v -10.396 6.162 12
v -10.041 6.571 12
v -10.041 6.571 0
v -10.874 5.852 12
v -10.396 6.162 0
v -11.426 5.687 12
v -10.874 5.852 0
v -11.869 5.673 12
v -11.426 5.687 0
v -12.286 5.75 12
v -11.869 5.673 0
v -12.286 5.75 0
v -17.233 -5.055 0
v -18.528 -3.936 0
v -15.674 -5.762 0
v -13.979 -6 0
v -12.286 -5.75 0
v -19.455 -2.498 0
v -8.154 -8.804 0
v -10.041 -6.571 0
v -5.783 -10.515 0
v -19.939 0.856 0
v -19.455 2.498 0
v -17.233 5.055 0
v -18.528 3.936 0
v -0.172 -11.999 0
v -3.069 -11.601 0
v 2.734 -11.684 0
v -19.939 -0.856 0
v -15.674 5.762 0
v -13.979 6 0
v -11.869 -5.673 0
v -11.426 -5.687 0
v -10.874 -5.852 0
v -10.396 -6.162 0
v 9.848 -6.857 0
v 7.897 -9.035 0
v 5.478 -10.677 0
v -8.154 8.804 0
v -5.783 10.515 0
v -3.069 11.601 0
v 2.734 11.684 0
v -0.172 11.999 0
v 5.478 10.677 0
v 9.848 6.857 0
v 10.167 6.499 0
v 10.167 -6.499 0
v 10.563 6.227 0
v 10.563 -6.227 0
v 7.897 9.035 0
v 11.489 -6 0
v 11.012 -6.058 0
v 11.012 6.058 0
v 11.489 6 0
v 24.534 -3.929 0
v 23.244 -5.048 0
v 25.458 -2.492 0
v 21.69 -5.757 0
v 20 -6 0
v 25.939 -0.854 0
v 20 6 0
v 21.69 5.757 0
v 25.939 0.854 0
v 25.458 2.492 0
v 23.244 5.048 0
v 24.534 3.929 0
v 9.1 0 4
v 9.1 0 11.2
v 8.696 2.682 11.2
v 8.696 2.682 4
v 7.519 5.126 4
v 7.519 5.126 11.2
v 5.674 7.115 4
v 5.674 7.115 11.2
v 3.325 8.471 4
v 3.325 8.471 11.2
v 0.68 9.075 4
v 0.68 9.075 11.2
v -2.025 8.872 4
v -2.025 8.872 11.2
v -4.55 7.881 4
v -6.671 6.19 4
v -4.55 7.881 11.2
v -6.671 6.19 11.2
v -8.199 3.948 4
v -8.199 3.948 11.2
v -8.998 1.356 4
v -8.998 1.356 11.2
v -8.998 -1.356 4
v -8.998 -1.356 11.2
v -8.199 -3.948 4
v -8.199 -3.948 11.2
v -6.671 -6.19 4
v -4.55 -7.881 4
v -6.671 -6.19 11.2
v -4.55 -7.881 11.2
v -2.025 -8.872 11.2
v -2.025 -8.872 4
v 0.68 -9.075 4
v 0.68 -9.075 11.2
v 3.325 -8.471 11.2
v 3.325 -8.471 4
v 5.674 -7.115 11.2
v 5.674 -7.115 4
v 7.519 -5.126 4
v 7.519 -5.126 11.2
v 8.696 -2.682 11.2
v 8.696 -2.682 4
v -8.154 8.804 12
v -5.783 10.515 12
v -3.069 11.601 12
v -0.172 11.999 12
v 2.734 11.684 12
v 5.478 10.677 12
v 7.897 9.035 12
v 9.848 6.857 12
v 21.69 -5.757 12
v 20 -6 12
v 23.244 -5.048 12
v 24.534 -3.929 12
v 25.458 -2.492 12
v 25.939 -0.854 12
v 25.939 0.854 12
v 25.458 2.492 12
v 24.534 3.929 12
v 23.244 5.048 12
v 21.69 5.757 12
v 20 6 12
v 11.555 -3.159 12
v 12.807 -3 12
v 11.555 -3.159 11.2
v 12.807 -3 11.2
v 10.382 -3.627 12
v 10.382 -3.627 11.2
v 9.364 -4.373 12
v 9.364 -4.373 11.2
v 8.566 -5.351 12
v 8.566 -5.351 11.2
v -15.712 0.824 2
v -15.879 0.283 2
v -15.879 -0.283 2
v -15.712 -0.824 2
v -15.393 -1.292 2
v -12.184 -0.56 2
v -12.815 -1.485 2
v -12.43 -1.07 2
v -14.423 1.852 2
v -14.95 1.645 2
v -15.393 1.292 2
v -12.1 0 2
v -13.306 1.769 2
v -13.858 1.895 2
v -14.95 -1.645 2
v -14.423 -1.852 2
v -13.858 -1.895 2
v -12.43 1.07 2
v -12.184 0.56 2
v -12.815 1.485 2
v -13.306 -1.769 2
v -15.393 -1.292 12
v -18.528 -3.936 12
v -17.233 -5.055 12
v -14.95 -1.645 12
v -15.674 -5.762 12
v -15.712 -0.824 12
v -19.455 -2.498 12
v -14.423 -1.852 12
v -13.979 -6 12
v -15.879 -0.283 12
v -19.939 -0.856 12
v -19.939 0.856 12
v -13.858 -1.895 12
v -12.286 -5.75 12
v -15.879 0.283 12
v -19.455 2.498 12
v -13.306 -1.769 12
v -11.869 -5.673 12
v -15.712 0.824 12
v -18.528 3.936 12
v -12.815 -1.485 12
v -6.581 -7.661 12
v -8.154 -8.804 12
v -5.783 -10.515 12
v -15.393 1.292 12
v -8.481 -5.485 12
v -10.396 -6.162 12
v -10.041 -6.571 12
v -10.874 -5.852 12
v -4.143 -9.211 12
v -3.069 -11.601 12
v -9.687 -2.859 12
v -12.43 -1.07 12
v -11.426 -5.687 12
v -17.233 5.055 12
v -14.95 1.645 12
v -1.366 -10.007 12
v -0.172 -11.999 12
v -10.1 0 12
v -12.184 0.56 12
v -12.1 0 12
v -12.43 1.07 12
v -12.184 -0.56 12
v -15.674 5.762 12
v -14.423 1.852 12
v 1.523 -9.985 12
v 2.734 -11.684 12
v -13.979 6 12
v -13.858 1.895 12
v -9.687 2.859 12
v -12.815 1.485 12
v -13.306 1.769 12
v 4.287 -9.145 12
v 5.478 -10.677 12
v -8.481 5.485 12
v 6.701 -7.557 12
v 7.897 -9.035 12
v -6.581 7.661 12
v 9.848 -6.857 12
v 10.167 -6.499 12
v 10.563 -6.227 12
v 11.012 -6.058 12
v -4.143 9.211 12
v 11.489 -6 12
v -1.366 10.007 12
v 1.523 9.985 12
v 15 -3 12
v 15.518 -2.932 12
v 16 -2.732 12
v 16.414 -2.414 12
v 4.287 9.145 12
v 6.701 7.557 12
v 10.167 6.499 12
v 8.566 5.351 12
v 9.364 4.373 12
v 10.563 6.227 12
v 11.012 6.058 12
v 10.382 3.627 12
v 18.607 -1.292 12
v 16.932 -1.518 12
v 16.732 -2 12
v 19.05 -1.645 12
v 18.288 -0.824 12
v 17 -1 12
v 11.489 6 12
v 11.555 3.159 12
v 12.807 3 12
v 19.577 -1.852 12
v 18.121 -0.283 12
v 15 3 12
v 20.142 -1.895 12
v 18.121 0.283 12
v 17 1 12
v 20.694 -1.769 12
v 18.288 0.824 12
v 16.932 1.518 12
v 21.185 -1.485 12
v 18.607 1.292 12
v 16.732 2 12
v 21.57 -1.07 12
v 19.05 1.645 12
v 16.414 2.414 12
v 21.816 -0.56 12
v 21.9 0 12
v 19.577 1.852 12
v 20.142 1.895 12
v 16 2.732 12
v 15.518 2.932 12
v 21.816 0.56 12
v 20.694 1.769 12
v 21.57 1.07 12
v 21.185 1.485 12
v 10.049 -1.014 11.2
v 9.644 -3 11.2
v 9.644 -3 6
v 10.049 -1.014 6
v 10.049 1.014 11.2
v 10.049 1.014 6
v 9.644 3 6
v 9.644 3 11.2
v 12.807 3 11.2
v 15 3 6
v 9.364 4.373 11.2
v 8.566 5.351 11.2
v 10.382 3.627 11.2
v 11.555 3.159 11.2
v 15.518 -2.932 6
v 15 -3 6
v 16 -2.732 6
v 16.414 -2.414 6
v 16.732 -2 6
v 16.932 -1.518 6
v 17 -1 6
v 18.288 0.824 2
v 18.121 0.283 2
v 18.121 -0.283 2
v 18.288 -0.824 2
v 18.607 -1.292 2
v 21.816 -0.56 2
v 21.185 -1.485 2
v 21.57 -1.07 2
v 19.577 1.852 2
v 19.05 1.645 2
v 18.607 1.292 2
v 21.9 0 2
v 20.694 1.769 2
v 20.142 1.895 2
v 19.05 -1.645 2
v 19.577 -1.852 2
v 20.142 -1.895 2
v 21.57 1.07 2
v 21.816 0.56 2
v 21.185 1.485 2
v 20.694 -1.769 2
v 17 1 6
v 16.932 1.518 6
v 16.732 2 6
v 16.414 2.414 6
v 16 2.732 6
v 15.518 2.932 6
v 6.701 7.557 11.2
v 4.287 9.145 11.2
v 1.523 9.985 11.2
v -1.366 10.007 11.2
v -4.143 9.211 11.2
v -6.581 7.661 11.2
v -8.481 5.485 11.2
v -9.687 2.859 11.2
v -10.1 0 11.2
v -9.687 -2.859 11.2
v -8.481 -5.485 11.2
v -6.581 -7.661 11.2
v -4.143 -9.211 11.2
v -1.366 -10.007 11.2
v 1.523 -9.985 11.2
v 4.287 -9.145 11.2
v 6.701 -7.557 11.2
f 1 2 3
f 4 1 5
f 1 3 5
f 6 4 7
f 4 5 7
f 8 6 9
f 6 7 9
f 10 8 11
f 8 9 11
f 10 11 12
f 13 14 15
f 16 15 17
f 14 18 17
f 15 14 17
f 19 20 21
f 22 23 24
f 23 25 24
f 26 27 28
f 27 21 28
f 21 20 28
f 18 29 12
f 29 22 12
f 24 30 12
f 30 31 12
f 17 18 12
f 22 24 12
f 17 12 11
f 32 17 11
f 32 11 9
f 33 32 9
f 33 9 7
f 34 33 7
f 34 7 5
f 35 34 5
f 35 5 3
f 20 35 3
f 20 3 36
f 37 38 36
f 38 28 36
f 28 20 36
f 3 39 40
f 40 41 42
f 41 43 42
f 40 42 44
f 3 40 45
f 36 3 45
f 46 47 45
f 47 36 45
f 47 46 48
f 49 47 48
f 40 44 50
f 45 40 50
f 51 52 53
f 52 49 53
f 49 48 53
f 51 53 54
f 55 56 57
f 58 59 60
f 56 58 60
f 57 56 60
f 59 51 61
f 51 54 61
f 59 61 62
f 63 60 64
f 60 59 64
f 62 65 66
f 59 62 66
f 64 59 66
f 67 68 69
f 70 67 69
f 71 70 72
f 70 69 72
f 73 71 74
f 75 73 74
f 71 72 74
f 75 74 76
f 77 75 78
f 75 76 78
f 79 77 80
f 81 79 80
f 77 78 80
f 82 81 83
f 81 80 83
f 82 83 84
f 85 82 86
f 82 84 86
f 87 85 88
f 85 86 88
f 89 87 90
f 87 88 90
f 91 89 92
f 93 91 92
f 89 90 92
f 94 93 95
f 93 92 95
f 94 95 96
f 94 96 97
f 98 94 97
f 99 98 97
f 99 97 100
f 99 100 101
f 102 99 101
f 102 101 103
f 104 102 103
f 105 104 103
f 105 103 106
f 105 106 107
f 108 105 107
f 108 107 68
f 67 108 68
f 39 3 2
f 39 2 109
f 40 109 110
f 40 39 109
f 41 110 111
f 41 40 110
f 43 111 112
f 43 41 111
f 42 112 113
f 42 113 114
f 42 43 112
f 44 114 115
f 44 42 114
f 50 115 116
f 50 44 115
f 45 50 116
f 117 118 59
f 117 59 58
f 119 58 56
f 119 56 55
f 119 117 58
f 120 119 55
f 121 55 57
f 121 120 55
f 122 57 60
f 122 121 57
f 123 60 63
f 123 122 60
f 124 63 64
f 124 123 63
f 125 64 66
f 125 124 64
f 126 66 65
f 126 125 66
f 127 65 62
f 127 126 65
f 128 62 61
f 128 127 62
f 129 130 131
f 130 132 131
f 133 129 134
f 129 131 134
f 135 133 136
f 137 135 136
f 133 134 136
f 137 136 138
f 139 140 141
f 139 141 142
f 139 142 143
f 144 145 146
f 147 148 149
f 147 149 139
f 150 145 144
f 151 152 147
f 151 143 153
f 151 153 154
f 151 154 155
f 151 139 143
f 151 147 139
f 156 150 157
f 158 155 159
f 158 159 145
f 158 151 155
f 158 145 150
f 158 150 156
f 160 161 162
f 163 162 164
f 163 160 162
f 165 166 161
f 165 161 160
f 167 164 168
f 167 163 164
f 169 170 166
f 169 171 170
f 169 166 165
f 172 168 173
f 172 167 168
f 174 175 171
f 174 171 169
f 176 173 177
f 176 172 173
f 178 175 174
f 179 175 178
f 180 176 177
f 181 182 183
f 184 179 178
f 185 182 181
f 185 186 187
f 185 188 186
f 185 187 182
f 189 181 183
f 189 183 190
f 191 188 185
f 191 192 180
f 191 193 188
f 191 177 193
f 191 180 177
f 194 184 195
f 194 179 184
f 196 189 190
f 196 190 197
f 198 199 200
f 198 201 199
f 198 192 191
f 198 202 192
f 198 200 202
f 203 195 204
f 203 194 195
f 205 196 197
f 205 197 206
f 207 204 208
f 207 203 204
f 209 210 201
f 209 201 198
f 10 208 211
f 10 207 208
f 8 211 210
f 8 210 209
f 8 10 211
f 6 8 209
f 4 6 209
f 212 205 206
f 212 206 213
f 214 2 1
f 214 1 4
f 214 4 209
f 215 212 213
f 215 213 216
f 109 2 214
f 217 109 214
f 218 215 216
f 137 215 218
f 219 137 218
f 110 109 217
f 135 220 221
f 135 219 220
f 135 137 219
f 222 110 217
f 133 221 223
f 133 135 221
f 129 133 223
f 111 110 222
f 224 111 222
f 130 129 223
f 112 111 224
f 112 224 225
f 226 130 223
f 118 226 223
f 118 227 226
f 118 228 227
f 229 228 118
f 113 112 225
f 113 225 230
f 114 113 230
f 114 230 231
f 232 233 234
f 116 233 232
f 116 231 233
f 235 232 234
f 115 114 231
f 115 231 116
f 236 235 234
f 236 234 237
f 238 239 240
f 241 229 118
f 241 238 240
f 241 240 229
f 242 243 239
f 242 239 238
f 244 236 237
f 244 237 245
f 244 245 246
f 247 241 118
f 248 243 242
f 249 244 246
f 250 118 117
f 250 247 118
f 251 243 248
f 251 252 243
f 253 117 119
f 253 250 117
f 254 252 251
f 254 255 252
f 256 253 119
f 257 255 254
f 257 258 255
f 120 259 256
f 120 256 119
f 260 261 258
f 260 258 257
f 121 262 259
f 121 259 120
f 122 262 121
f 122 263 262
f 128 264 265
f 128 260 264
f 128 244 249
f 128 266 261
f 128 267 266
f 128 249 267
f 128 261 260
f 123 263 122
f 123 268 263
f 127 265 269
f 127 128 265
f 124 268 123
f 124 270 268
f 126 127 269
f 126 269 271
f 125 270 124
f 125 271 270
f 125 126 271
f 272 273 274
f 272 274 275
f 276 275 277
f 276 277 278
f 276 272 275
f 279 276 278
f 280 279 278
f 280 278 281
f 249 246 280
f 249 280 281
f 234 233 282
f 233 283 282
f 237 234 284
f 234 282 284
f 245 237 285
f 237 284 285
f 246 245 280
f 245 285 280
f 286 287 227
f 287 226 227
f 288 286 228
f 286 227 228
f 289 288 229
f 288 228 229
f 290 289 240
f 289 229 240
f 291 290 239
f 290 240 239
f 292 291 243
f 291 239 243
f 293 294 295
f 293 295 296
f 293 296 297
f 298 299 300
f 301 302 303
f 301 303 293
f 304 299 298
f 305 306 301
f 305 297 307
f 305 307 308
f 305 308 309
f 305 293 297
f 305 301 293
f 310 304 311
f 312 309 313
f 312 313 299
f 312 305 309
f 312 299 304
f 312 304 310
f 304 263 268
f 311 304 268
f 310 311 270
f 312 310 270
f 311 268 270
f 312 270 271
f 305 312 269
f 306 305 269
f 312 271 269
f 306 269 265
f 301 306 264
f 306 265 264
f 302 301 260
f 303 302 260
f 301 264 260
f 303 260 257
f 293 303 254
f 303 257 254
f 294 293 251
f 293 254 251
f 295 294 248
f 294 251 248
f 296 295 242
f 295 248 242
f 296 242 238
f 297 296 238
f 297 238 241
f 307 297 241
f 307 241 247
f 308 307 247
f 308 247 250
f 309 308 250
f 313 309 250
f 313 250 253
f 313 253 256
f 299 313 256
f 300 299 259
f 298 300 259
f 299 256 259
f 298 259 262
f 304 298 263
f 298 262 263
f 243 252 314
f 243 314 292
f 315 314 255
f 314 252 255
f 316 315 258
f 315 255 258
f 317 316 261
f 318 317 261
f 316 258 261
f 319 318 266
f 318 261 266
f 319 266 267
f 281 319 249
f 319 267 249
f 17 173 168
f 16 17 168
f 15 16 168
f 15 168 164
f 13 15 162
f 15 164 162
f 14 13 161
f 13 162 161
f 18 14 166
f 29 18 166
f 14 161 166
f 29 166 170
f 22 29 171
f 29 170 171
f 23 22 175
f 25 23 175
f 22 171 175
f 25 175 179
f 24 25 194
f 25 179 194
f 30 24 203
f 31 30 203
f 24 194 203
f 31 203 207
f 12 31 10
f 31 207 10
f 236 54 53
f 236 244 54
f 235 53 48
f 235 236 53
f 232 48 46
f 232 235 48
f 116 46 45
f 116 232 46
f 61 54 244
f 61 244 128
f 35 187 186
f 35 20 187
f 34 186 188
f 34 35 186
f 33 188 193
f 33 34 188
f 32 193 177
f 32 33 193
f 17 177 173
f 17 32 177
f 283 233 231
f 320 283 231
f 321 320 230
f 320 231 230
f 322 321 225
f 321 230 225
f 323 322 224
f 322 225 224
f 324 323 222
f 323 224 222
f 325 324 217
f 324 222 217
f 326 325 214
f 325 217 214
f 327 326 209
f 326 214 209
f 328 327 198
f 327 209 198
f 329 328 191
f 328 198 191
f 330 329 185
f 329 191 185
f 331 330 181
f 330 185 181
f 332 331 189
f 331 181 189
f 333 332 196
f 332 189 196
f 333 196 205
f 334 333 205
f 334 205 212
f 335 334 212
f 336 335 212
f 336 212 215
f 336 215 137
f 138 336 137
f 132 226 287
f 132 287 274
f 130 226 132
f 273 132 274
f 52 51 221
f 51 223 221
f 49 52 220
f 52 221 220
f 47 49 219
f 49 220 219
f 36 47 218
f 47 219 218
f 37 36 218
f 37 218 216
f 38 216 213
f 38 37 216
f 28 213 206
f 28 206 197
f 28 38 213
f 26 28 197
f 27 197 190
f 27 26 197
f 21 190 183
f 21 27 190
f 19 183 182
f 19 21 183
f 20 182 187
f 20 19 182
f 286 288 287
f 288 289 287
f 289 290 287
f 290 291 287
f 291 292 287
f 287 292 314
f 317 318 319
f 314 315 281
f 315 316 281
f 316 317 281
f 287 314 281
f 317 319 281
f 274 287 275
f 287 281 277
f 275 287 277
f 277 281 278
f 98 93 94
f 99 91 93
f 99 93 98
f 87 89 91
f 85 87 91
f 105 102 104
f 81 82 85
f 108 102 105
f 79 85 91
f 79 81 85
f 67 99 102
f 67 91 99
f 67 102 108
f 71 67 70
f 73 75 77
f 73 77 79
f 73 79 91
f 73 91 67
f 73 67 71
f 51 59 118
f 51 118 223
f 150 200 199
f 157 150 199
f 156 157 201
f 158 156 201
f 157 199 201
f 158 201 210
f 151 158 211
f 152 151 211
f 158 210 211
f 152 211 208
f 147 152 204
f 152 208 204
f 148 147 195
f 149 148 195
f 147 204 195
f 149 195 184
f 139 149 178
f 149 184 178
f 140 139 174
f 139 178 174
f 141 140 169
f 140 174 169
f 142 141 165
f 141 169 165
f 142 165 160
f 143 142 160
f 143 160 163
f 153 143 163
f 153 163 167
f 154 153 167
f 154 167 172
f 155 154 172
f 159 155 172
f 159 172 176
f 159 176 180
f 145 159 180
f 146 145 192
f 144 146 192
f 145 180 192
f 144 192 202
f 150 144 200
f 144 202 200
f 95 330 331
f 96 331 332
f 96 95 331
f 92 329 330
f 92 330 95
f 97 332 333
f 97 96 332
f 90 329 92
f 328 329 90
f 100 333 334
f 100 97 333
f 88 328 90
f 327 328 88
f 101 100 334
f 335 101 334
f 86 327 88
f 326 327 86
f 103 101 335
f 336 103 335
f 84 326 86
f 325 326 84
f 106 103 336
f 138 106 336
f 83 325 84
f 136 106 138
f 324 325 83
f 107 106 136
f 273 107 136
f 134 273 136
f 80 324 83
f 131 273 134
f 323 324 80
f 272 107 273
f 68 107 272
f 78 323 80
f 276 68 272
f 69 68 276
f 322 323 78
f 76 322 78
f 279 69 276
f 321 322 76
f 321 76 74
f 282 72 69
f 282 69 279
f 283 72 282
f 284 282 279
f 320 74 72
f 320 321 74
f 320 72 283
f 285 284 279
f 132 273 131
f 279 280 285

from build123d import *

# Parameters (mm, degrees)
BOSS_EXTRU_1_DEPTH      = 12
ESQUISSE2_R             = 9.1
ENL_V_MAT_EXTRU_3_DEPTH = 8
ENL_V_MAT_EXTRU_4_DEPTH = 6
ENL_V_MAT_EXTRU_5_DEPTH = 0.8
BOSS_EXTRU_2_DEPTH      = 12
ESQUISSE6_R             = 1.9
ENL_V_MAT_EXTRU_6_DEPTH = 10
CONG_1_R                = 5
CONG_2_R                = 2


with BuildPart() as part:
    # Esquisse1 → Boss.-Extru.1 (new body)
    with BuildSketch(Plane.XY):
        with BuildLine():
            Line((10.392304845, 6), (20, 6))
            Line((20, 6), (20, -6))
            Line((20, -6), (10.392304845, -6))
            ThreePointArc((10.392304845, -6), (-12, 0), (10.392304845, 6))
        make_face()
    extrude(amount=BOSS_EXTRU_1_DEPTH)

    # Esquisse2 → Enlèv. mat.-Extru.3 (cut)
    with BuildSketch(Plane.XY.offset(12)):
        Circle(ESQUISSE2_R)
    extrude(amount=-ENL_V_MAT_EXTRU_3_DEPTH, mode=Mode.SUBTRACT)

    # Esquisse3 → Enlèv. mat.-Extru.4 (cut)
    with BuildSketch(Plane.XY.offset(12)):
        with BuildLine():
            Line((9.644169223, 3), (17, 3))
            Line((17, 3), (17, -3))
            Line((17, -3), (9.644169223, -3))
            ThreePointArc((9.644169223, -3), (10.1, 0), (9.644169223, 3))
        make_face()
    extrude(amount=-ENL_V_MAT_EXTRU_4_DEPTH, mode=Mode.SUBTRACT)

    # Esquisse4 → Enlèv. mat.-Extru.5 (cut)
    with BuildSketch(Plane.XY.offset(12)):
        with BuildLine():
            Line((17, -3), (17, 3))
            Line((17, 3), (9.644169223, 3))
            ThreePointArc((9.644169223, 3), (-10.1, 0), (9.644169223, -3))
            Line((9.644169223, -3), (17, -3))
        make_face()
    extrude(amount=-ENL_V_MAT_EXTRU_5_DEPTH, mode=Mode.SUBTRACT)

    # Esquisse5 → Boss.-Extru.2 (add)
    with BuildSketch(Plane.XY.offset(12)):
        with BuildLine():
            Line((20, 6), (20, -6))
            ThreePointArc((20, -6), (26, 0), (20, 6))
        make_face()
        with BuildLine():
            Line((-10.857142857, 5.11101252), (-10.857142857, -5.11101252))
            ThreePointArc((-10.857142857, -5.11101252), (-20, 0), (-10.857142857, 5.11101252))
        make_face()
    extrude(amount=-BOSS_EXTRU_2_DEPTH)

    # Esquisse6 → Enlèv. mat.-Extru.6 (cut)
    with BuildSketch(Plane.XY.offset(12)):
        with Locations((-14, 0)):
            Circle(ESQUISSE6_R)
        with Locations((20, 0)):
            Circle(ESQUISSE6_R)
    extrude(amount=-ENL_V_MAT_EXTRU_6_DEPTH, mode=Mode.SUBTRACT)

    # Congé1
    cong_1_edges = [part.edges().sort_by_distance(p)[0] for p in [
        (9.644169223, 3, 11.6),
        (9.644169223, -3, 11.6),
    ]]
    fillet(cong_1_edges, radius=CONG_1_R)

    # Congé2
    cong_2_edges = [part.edges().sort_by_distance(p)[0] for p in [
        (17, 3, 9),
        (17, -3, 9),
        (-10.857142857, -5.11101252, 6),
        (-10.857142857, 5.11101252, 6),
        (10.392304845, 6, 6),
        (10.392304845, -6, 6),
    ]]
    fillet(cong_2_edges, radius=CONG_2_R)


solid = part.part
